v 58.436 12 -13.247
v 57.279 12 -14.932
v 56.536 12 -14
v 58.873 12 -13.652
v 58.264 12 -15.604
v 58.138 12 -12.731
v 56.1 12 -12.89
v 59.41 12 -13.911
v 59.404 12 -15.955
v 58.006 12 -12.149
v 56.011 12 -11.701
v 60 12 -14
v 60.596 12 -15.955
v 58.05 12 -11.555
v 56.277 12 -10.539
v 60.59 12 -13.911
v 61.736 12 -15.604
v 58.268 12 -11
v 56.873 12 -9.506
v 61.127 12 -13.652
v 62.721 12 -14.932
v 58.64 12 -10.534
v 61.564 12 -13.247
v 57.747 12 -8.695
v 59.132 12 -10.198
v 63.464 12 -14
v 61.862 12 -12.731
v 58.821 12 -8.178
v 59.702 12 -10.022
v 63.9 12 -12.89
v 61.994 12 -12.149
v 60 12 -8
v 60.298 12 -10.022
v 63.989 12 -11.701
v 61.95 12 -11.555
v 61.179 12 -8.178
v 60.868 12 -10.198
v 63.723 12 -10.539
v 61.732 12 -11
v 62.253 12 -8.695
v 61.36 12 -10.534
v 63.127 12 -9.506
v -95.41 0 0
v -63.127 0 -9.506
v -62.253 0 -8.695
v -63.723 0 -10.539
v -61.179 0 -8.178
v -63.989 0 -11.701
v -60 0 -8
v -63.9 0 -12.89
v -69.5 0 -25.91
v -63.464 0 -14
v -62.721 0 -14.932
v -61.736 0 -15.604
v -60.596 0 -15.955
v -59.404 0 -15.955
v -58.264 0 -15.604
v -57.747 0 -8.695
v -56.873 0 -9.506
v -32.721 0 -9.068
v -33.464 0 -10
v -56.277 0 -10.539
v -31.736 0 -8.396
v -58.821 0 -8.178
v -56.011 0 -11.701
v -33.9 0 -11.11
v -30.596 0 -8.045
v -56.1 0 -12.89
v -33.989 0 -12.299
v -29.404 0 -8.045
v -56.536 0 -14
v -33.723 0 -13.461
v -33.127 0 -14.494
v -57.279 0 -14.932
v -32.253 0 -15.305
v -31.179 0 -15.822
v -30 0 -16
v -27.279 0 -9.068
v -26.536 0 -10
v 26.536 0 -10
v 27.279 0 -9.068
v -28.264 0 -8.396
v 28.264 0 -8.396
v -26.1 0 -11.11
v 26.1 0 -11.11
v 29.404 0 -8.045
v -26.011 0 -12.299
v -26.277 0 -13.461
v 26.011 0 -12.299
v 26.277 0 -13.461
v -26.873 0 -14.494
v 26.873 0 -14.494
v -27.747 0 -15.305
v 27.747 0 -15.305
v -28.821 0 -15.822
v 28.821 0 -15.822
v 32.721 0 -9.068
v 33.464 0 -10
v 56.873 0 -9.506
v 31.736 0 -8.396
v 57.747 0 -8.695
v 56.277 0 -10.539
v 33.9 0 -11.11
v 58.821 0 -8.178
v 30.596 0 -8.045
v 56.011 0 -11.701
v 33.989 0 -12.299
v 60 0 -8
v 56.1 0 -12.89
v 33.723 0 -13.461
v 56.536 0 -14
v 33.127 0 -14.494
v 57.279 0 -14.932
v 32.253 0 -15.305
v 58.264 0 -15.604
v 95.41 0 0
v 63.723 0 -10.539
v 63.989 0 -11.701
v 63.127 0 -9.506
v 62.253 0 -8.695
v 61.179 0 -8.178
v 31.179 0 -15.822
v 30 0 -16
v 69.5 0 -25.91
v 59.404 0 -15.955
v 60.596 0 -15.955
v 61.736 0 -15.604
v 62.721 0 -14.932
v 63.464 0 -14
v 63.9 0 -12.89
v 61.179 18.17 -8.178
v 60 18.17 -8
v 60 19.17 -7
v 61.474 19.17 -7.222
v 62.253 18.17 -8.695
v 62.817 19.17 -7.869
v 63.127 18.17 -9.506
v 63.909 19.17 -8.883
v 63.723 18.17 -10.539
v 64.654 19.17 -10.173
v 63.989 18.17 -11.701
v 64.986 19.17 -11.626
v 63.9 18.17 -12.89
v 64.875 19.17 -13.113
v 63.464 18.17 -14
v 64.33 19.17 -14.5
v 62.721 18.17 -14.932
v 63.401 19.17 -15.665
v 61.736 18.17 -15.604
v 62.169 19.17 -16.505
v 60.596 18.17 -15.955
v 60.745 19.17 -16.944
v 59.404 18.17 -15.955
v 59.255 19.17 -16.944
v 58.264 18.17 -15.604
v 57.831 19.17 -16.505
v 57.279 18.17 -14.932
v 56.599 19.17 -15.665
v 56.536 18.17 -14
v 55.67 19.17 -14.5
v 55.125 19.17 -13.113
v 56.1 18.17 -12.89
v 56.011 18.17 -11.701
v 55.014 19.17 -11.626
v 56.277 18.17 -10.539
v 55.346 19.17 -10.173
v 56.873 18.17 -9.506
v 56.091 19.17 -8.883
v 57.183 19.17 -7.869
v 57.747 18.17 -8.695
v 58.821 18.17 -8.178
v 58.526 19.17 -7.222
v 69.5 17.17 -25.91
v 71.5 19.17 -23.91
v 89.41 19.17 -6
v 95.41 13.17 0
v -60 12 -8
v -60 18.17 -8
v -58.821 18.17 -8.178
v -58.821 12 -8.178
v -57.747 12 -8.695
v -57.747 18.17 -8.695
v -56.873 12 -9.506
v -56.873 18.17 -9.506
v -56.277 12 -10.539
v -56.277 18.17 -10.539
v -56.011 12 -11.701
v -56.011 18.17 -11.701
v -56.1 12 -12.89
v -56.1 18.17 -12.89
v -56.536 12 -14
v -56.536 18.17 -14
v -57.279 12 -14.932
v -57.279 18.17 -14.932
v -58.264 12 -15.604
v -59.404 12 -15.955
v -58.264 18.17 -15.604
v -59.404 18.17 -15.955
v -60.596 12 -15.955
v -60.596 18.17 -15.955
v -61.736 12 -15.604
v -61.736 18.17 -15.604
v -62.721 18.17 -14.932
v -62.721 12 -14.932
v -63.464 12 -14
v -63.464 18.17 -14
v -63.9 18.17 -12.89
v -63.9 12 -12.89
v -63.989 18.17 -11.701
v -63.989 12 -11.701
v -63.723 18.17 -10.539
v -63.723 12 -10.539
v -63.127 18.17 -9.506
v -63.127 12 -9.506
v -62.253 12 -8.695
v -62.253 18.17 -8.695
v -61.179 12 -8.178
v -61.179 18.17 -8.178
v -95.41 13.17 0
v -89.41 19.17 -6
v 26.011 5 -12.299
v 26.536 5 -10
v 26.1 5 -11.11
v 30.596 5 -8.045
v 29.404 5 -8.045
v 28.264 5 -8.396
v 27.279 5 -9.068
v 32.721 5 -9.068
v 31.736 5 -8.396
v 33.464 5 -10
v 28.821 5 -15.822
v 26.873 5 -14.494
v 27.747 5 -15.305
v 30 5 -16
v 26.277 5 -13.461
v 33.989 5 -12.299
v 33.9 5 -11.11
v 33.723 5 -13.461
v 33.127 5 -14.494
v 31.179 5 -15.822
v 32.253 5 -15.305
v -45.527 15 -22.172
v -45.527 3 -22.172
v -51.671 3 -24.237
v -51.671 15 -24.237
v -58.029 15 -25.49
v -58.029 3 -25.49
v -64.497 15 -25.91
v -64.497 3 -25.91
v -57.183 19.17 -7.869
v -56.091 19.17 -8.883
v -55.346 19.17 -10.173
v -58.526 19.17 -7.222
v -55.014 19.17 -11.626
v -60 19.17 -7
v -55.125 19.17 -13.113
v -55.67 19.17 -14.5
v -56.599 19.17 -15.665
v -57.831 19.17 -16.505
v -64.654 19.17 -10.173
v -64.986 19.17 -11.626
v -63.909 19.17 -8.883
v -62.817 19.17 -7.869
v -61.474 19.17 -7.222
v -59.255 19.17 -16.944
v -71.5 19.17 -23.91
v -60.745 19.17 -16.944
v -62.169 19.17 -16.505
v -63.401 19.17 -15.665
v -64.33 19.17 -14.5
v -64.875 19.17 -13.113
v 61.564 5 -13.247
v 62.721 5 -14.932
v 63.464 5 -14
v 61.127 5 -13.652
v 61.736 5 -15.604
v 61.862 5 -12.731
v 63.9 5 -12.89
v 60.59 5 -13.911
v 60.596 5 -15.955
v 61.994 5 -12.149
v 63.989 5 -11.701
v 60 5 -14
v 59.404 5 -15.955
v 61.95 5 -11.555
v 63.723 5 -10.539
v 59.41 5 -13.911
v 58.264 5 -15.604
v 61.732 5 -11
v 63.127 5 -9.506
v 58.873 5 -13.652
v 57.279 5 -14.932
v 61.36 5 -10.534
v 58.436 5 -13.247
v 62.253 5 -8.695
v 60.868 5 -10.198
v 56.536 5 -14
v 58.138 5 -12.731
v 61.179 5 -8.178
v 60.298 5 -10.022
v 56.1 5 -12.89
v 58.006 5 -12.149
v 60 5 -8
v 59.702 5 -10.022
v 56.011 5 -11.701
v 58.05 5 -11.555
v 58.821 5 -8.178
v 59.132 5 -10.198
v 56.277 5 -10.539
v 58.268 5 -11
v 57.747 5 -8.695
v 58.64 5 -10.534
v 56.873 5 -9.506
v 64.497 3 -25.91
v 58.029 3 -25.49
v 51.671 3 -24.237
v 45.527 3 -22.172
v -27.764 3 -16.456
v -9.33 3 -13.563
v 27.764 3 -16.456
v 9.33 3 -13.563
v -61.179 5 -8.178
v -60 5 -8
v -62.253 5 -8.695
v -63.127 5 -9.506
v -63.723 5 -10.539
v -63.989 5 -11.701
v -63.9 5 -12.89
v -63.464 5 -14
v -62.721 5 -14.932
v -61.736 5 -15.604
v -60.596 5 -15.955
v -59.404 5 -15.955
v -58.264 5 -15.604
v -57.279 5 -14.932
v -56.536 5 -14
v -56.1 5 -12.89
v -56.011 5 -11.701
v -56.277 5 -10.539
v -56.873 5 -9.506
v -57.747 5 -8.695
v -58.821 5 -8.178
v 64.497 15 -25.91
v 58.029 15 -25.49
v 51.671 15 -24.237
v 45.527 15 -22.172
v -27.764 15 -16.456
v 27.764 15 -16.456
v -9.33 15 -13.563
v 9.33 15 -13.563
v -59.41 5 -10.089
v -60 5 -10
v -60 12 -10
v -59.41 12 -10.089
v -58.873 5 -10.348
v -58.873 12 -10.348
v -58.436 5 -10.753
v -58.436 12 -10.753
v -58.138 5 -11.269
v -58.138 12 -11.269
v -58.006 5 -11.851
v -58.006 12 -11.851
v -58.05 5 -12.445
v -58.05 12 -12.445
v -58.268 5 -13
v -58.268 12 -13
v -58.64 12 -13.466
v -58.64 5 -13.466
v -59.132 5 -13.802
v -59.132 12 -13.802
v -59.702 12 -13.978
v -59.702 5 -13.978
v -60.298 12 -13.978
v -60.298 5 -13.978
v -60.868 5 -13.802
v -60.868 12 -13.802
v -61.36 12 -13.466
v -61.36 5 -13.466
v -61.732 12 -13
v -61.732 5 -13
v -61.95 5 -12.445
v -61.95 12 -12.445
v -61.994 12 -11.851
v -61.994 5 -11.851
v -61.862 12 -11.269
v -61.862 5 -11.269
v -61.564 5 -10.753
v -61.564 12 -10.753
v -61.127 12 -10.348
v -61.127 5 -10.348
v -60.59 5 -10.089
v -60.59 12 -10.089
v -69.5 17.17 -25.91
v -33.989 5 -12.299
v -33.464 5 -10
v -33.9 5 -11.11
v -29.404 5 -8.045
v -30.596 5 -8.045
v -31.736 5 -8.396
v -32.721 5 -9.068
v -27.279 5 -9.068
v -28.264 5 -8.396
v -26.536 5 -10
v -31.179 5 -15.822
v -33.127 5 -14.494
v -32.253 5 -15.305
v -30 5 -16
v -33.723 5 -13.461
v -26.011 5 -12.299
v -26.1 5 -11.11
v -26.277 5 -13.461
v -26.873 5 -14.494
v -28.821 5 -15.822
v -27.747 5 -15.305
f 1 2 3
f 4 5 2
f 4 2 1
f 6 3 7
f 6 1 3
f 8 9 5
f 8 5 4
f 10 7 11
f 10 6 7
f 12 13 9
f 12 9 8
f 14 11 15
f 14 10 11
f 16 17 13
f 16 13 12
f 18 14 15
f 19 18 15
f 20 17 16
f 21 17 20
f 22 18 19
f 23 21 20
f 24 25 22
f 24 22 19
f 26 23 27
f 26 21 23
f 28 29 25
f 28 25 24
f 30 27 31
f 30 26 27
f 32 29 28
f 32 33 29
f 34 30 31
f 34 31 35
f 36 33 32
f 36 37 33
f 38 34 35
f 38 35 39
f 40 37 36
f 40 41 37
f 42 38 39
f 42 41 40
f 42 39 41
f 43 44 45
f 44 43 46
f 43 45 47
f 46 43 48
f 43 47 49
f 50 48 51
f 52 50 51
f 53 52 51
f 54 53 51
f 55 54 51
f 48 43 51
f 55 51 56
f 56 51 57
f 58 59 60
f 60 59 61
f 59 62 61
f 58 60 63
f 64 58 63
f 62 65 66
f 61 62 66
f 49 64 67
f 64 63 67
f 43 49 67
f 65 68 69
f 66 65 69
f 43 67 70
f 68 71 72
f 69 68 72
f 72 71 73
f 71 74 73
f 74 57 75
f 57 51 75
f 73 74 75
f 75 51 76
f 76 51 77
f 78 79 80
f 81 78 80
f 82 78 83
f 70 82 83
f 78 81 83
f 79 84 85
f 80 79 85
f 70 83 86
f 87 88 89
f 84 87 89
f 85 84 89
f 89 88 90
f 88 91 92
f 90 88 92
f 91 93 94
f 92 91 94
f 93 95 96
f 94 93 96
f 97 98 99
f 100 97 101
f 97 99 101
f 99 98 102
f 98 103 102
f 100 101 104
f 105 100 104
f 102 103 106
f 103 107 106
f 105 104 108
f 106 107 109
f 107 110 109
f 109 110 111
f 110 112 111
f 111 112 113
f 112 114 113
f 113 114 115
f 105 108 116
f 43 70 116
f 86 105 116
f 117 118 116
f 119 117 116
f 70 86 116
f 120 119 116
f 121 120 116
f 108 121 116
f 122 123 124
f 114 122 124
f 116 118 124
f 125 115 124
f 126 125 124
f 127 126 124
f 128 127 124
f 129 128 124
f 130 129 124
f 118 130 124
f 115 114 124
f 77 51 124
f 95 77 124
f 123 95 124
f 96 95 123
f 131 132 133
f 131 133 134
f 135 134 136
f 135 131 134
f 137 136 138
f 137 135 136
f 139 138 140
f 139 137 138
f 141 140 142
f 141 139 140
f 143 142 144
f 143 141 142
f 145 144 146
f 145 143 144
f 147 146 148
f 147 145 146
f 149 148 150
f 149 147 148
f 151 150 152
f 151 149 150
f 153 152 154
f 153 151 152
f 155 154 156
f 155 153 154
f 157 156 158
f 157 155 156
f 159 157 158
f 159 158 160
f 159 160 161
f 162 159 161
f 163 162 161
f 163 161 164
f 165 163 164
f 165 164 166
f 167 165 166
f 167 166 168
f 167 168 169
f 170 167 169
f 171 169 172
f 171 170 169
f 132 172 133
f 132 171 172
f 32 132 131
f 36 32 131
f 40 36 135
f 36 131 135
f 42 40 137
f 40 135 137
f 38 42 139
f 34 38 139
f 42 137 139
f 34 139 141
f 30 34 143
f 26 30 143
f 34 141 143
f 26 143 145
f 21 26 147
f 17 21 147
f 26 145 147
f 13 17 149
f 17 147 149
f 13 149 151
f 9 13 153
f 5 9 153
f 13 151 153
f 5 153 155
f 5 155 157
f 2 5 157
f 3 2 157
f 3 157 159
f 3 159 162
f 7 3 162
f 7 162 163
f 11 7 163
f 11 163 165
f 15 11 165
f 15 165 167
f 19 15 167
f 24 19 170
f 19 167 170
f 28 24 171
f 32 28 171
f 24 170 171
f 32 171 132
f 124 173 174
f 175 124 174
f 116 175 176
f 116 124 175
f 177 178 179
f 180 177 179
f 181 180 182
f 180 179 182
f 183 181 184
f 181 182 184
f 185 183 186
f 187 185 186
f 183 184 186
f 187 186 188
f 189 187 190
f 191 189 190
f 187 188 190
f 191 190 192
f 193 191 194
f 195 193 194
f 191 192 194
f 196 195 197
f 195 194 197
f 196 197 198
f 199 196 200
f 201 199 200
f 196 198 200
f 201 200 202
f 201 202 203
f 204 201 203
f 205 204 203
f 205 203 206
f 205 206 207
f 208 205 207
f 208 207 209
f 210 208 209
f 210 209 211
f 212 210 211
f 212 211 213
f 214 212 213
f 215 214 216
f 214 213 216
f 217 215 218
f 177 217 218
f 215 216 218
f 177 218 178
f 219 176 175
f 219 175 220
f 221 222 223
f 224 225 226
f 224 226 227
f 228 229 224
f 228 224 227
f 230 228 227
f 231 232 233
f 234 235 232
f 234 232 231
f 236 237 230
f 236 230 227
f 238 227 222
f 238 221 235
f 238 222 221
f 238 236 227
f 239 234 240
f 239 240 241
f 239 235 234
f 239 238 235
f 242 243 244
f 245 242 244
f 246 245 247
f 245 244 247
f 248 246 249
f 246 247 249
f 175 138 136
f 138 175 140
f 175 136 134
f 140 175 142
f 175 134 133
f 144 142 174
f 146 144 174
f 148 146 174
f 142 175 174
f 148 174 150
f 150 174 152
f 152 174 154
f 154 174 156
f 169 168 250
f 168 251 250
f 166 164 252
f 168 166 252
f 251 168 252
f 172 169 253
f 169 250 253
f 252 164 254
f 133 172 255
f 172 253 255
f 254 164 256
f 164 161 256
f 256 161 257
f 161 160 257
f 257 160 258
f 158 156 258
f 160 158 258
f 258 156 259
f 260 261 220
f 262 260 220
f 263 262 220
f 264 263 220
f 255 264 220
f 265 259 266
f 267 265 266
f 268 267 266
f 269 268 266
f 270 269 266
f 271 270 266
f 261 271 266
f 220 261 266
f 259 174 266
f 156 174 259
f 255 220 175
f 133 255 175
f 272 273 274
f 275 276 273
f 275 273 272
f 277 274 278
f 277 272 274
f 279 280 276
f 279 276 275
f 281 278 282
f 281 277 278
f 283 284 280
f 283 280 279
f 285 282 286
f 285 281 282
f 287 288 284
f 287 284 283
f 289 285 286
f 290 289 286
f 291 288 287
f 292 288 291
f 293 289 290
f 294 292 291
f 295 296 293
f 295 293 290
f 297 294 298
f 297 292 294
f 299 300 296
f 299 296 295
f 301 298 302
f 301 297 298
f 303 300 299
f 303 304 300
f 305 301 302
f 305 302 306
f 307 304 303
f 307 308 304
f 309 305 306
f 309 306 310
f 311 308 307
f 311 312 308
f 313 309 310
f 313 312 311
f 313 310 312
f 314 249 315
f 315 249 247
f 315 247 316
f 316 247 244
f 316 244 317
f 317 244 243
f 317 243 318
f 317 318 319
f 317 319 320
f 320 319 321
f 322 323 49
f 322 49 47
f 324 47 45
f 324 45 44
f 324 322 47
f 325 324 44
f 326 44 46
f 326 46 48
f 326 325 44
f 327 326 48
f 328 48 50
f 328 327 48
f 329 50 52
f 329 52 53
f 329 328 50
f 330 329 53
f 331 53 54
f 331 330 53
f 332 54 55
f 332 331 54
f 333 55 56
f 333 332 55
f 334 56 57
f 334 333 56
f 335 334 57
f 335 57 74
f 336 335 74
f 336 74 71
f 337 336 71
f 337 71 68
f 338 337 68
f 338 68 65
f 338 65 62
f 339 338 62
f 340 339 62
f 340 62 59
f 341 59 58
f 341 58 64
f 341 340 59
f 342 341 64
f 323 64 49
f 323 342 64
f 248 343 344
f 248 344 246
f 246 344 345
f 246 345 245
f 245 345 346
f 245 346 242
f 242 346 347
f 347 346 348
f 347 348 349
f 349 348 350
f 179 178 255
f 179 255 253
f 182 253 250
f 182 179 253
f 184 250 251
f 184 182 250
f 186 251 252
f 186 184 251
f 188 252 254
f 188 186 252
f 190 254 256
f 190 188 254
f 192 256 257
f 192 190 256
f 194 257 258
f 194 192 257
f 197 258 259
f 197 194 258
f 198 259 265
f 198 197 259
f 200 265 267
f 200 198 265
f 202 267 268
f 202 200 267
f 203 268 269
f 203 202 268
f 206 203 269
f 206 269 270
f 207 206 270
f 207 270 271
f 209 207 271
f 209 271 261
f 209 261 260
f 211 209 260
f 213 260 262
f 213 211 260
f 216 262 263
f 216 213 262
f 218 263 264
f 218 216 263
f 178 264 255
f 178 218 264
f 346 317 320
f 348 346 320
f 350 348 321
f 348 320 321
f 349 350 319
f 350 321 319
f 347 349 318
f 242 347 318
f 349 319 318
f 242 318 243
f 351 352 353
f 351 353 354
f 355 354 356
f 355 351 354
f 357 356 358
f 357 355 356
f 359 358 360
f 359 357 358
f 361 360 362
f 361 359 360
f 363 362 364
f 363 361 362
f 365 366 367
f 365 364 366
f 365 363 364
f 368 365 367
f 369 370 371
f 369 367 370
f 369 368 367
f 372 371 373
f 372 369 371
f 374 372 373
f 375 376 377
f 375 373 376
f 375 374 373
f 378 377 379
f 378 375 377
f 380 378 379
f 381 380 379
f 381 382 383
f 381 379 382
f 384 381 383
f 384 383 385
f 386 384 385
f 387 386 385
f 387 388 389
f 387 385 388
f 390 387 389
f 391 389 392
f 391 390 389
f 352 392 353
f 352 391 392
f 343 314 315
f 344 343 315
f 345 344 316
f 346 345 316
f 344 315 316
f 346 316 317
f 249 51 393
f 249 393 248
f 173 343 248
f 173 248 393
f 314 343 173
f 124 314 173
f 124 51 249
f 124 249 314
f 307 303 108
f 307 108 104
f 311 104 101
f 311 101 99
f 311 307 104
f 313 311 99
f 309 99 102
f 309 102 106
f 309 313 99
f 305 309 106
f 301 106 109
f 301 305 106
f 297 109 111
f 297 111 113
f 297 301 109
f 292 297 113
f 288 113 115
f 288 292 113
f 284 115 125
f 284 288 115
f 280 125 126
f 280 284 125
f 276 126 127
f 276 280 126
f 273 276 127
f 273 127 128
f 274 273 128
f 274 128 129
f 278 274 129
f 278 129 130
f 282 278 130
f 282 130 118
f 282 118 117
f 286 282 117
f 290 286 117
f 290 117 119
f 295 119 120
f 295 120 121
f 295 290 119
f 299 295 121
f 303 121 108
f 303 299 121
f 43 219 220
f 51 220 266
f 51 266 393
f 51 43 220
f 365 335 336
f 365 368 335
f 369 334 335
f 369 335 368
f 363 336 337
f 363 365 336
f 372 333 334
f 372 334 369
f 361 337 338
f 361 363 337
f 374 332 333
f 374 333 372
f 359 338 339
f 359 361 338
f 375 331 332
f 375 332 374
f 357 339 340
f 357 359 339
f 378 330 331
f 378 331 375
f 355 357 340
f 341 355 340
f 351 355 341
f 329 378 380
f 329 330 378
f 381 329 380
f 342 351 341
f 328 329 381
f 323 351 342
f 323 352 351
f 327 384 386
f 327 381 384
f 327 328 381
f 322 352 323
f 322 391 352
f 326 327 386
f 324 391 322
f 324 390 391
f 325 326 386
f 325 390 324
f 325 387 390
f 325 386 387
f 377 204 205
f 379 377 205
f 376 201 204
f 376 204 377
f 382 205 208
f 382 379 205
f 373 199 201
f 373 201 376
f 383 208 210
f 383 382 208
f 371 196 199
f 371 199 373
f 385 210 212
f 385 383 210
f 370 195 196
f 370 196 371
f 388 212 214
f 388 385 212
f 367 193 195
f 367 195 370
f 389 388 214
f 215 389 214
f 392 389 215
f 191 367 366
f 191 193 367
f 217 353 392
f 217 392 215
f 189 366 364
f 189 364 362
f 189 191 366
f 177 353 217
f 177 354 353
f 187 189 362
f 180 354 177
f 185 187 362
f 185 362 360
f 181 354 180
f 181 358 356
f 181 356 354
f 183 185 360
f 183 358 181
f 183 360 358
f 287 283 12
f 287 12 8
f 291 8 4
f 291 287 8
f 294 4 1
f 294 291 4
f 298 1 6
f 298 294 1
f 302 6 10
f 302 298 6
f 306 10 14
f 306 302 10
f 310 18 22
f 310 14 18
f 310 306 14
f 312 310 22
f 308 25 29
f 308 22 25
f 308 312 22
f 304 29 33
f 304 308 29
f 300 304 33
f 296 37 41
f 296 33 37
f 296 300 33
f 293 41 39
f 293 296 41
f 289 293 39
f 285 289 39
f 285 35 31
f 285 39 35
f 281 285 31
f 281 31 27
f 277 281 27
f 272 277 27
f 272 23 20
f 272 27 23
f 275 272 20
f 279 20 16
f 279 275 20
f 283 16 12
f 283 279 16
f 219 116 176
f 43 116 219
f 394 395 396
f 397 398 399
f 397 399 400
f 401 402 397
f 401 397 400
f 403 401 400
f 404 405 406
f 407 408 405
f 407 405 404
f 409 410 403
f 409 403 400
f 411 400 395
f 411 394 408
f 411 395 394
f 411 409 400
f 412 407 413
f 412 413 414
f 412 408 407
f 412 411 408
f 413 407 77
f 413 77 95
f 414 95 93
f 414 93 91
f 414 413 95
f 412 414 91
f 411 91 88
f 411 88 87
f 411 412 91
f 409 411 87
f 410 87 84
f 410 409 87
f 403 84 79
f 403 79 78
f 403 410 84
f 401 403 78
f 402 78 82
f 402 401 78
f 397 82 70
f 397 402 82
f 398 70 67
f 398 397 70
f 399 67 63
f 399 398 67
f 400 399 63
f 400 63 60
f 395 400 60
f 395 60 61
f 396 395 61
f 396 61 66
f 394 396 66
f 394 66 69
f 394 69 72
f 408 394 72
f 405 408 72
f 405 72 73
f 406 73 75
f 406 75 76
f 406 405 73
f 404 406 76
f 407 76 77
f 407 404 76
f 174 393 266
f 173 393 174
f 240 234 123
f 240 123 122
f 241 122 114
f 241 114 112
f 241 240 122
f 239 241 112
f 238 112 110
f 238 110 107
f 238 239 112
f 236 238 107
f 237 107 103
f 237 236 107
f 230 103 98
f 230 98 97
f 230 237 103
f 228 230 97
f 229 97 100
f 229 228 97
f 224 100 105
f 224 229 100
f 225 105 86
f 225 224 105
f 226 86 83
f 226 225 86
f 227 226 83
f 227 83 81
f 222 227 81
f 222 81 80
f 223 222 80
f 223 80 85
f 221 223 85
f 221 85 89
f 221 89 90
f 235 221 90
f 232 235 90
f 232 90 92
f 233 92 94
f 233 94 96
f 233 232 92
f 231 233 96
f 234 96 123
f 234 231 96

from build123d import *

# Parameters (mm, degrees)
BOSS_EXTRUDE1_DEPTH     = 3
BOSS_EXTRUDE2_DEPTH     = 12
BOSS_EXTRUDE3_DEPTH     = 4.17
CUT_EXTRUDE1_DEPTH      = 101.179165
CUT_EXTRUDE1_DEPTH_BACK = 101.179165
SKETCH3_R               = 2
CHAMFER1_SIZE           = 6
SKETCH8_R               = 4
CUT_EXTRUDE2_DEPTH      = 7.17
CHAMFER2_SIZE           = 1
CUT_EXTRUDE4_START      = -5
SKETCH9_R               = 4
CUT_EXTRUDE4_DEPTH      = 5
CHAMFER3_SIZE           = 2


with BuildPart() as part:
    # Sketch1 → Boss-Extrude1 (new body)
    with BuildSketch(Plane(origin=(0, 0, 0), x_dir=(1, 0, 0), z_dir=(0, 1, 0))):
        Polygon((-95.41, 0), (95.41, 0), (69.5, 25.91), (-69.5, 25.91), align=None)
    extrude(amount=BOSS_EXTRUDE1_DEPTH)

    # Sketch5 → Boss-Extrude2 (add)
    with BuildSketch(Plane(origin=(0, 3, 0), x_dir=(1, 0, 0), z_dir=(0, 1, 0))):
        with BuildLine():
            Line((-64.496944889, 25.91), (-69.5, 25.91))
            Line((-69.5, 25.91), (-95.41, 0))
            Line((-95.41, 0), (95.41, 0))
            Line((95.41, 0), (69.5, 25.91))
            Line((69.5, 25.91), (64.496944889, 25.91))
            ThreePointArc((64.496944889, 25.91), (54.829686624, 24.966540009), (45.527255216, 22.171764706))
            ThreePointArc((45.527255216, 22.171764706), (0, 13.2), (-45.527255216, 22.171764706))
            ThreePointArc((-45.527255216, 22.171764706), (-54.829686624, 24.966540009), (-64.496944889, 25.91))
        make_face()
    extrude(amount=BOSS_EXTRUDE2_DEPTH)

    # Sketch7 → Boss-Extrude3 (add)
    with BuildSketch(Plane(origin=(0, 15, 0), x_dir=(1, 0, 0), z_dir=(0, 1, 0))):
        Polygon((-95.41, 0), (-69.5, 25.91), (69.5, 25.91), (95.41, 0), align=None)
    extrude(amount=BOSS_EXTRUDE3_DEPTH)

    # Sketch3 → Cut-Extrude1 (cut, two sides: drawn at the far end of the back side and taken through both)
    with BuildSketch(Plane(origin=(0, 3, 0), x_dir=(1, 0, 0), z_dir=(0, 1, 0)).offset(-CUT_EXTRUDE1_DEPTH_BACK)):
        with Locations(Location((-60, 12, 0), (0, 0, 270))):
            Circle(SKETCH3_R)
        with Locations(Location((60, 12, 0), (0, 0, 90))):
            Circle(SKETCH3_R)
    extrude(amount=CUT_EXTRUDE1_DEPTH + CUT_EXTRUDE1_DEPTH_BACK, mode=Mode.SUBTRACT)

    # Chamfer1
    chamfer1_edges = [part.edges().sort_by_distance(p)[0] for p in [
        (0, 19.17, 0),
    ]]
    chamfer(chamfer1_edges, length=CHAMFER1_SIZE)

    # Sketch8 → Cut-Extrude2 (cut)
    with BuildSketch(Plane(origin=(0, 19.17, 0), x_dir=(1, 0, 0), z_dir=(0, 1, 0))):
        with Locations(Location((-60, 12, 0), (0, 0, 270))):
            Circle(SKETCH8_R)
        with Locations(Location((60, 12, 0), (0, 0, 270))):
            Circle(SKETCH8_R)
    extrude(amount=-CUT_EXTRUDE2_DEPTH, mode=Mode.SUBTRACT)

    # Chamfer2
    chamfer2_edges = [part.edges().sort_by_distance(p)[0] for p in [
        (-60, 19.17, -16),
        (60, 19.17, -16),
    ]]
    chamfer(chamfer2_edges, length=CHAMFER2_SIZE)

    # Sketch9 → Cut-Extrude4 (cut)
    with BuildSketch(Plane(origin=(0, 0, 0), x_dir=(-1, 0, 0), z_dir=(0, -1, 0)).offset(CUT_EXTRUDE4_START)):
        with Locations(Location((60, 12, 0), (0, 0, 270))):
            Circle(SKETCH9_R)
        with Locations(Location((30, 12, 0), (0, 0, 90))):
            Circle(SKETCH9_R)
        with Locations(Location((-30, 12, 0), (0, 0, 90))):
            Circle(SKETCH9_R)
        with Locations(Location((-60, 12, 0), (0, 0, 270))):
            Circle(SKETCH9_R)
    extrude(amount=CUT_EXTRUDE4_DEPTH, mode=Mode.SUBTRACT)

    # Chamfer3
    chamfer3_edges = [part.edges().sort_by_distance(p)[0] for p in [
        (0, 19.17, -25.91),
    ]]
    chamfer(chamfer3_edges, length=CHAMFER3_SIZE)


solid = part.part
